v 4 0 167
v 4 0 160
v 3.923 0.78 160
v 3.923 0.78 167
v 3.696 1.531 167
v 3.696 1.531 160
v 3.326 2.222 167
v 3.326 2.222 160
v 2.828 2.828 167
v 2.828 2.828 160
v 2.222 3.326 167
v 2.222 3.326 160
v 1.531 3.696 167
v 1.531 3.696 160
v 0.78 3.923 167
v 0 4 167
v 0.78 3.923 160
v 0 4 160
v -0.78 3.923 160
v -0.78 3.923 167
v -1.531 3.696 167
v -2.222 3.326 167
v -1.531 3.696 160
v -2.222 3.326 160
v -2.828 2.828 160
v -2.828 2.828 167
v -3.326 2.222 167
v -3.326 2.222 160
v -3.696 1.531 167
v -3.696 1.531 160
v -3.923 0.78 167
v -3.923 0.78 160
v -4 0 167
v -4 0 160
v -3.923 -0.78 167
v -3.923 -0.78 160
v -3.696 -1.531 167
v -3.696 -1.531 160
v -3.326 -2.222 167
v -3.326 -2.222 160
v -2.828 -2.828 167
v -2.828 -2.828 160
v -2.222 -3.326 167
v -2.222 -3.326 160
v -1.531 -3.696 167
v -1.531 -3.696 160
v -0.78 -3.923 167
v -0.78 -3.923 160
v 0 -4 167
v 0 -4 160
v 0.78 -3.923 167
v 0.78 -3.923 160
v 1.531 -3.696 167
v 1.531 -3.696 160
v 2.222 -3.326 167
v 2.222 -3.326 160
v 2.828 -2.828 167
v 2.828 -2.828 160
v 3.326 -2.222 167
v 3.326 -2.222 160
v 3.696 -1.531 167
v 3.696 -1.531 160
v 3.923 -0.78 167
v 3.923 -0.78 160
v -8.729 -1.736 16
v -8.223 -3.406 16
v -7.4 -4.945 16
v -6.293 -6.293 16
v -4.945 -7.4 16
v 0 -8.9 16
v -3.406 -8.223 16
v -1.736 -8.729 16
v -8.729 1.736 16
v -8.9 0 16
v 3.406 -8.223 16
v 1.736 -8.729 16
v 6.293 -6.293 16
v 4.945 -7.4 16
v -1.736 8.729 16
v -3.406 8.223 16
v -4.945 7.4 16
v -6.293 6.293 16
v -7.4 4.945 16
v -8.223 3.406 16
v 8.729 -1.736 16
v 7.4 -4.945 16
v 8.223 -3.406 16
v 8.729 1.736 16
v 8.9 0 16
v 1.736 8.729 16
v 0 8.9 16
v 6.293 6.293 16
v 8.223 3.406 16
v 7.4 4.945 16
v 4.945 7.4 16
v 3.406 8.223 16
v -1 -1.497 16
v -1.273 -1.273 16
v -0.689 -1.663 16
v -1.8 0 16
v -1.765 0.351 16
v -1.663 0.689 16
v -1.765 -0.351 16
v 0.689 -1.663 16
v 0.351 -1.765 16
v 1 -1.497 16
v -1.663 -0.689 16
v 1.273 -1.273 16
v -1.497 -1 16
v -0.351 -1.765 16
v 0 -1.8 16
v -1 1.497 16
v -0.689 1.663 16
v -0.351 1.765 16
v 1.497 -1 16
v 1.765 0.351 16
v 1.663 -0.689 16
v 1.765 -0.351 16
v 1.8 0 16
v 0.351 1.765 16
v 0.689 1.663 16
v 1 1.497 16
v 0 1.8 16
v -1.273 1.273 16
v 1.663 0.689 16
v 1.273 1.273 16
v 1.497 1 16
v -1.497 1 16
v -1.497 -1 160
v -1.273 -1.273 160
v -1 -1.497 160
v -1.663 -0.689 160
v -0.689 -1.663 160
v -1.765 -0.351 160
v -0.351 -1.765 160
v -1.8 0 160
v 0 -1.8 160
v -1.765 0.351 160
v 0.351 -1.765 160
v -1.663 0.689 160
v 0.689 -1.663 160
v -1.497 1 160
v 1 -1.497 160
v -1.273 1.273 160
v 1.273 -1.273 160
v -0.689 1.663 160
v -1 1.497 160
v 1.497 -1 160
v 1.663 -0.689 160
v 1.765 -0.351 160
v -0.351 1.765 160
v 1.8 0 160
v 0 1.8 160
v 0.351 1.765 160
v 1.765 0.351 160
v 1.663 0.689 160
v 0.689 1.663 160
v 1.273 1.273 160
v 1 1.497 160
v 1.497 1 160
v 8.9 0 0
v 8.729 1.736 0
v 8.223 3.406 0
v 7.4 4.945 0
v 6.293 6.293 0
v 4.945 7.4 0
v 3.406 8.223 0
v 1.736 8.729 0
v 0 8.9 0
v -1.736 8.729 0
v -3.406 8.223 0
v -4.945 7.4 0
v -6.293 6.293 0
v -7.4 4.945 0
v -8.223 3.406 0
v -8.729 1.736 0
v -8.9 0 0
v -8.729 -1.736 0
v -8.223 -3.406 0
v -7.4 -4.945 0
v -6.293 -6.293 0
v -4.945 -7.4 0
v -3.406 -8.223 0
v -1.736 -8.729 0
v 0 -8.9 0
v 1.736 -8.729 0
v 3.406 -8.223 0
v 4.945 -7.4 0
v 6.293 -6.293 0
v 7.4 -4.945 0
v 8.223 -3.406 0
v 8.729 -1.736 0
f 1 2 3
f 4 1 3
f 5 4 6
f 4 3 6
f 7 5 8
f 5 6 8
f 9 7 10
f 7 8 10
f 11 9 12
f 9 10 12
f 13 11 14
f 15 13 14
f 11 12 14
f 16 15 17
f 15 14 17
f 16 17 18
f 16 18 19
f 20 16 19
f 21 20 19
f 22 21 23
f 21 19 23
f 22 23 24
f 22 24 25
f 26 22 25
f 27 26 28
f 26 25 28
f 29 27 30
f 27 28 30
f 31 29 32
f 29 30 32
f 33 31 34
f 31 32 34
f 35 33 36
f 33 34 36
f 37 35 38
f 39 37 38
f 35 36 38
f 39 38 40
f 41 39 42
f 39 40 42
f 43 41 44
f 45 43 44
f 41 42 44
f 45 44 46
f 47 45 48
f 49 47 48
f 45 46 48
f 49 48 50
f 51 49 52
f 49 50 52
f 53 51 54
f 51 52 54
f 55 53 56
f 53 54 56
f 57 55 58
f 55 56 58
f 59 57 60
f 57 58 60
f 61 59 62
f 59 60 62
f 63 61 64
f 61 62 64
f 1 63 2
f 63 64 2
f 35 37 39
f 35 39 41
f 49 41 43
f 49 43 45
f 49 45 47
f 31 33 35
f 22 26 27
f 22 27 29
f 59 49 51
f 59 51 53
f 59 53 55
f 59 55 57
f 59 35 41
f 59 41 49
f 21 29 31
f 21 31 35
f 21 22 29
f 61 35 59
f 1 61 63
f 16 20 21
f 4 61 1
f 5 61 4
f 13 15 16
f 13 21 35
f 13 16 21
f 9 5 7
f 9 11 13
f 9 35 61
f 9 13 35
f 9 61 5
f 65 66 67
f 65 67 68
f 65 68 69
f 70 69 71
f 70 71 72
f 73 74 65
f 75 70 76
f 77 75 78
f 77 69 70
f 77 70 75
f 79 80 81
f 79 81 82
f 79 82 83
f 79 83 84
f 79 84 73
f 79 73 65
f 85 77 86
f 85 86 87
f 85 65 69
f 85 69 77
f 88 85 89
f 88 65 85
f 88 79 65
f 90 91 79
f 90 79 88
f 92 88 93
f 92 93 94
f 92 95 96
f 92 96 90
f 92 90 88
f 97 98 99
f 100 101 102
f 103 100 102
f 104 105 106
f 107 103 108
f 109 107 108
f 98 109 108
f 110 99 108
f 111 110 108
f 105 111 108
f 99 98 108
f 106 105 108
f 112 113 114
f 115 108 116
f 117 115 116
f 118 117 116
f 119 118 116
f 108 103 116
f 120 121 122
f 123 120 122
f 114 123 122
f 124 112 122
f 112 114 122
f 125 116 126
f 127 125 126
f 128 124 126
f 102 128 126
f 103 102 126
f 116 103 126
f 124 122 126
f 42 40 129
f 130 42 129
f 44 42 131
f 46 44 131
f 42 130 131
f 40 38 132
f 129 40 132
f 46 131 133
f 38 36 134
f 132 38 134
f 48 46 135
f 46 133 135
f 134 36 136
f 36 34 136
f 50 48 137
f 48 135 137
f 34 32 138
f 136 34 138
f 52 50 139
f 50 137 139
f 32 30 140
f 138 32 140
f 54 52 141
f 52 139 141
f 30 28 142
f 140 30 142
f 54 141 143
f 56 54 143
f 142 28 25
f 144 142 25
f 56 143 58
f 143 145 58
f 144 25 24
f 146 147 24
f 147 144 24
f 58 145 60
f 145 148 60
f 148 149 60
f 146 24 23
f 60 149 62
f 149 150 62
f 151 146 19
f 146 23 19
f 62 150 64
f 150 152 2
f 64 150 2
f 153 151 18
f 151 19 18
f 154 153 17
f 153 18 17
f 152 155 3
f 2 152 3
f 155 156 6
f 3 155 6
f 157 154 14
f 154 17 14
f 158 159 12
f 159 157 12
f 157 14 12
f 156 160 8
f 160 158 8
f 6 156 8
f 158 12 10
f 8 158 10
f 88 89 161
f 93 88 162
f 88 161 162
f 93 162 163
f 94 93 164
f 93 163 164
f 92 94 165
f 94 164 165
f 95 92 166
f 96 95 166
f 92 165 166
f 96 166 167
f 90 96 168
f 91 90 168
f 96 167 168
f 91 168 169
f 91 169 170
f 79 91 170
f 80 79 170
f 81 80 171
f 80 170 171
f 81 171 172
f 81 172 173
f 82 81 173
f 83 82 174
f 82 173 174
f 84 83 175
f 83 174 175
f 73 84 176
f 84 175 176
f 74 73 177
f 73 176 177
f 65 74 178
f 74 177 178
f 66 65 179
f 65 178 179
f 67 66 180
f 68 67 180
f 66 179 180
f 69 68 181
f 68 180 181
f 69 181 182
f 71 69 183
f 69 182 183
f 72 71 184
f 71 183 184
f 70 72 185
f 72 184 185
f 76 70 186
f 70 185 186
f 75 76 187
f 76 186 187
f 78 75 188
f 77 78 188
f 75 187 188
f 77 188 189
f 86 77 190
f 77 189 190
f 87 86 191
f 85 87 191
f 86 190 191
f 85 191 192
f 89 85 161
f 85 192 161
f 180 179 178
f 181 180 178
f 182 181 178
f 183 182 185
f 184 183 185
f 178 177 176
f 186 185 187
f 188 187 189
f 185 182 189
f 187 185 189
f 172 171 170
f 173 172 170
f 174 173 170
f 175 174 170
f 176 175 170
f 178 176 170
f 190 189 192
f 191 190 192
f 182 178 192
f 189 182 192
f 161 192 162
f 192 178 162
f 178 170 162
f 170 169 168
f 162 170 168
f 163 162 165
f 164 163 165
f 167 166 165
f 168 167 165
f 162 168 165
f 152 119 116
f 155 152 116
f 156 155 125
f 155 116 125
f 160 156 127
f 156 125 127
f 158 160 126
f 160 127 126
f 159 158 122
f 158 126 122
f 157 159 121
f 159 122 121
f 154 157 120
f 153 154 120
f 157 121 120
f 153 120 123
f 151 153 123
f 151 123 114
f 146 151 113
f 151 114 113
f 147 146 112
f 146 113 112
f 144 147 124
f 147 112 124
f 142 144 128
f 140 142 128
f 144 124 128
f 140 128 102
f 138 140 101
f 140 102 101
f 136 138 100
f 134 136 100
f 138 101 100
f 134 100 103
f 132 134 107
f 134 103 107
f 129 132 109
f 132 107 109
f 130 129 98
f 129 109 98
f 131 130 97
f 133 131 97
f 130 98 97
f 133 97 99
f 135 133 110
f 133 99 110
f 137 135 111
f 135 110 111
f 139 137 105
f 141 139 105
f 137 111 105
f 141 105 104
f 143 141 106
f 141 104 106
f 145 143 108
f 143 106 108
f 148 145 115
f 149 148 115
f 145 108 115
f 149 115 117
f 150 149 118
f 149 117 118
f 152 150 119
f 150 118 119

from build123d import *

# Parameters (mm, degrees)
SKETCH1_R           = 8.9
BOSS_EXTRUDE1_DEPTH = 16
SKETCH2_R           = 1.8
BOSS_EXTRUDE2_DEPTH = 144
SKETCH4_R           = 4
BOSS_EXTRUDE3_DEPTH = 7


with BuildPart() as part:
    # Sketch1 → Boss-Extrude1 (new body)
    with BuildSketch(Plane.XY):
        Circle(SKETCH1_R)
    extrude(amount=BOSS_EXTRUDE1_DEPTH)


with BuildPart() as body_2:
    # Sketch2 → Boss-Extrude2 (new body)
    with BuildSketch(Plane.XY.offset(16)):
        Circle(SKETCH2_R)
    extrude(amount=BOSS_EXTRUDE2_DEPTH)

    # Sketch4 → Boss-Extrude3 (add)
    with BuildSketch(Plane.XY.offset(160)):
        Circle(SKETCH4_R)
    extrude(amount=BOSS_EXTRUDE3_DEPTH)


solid = Compound([part.part, body_2.part])
